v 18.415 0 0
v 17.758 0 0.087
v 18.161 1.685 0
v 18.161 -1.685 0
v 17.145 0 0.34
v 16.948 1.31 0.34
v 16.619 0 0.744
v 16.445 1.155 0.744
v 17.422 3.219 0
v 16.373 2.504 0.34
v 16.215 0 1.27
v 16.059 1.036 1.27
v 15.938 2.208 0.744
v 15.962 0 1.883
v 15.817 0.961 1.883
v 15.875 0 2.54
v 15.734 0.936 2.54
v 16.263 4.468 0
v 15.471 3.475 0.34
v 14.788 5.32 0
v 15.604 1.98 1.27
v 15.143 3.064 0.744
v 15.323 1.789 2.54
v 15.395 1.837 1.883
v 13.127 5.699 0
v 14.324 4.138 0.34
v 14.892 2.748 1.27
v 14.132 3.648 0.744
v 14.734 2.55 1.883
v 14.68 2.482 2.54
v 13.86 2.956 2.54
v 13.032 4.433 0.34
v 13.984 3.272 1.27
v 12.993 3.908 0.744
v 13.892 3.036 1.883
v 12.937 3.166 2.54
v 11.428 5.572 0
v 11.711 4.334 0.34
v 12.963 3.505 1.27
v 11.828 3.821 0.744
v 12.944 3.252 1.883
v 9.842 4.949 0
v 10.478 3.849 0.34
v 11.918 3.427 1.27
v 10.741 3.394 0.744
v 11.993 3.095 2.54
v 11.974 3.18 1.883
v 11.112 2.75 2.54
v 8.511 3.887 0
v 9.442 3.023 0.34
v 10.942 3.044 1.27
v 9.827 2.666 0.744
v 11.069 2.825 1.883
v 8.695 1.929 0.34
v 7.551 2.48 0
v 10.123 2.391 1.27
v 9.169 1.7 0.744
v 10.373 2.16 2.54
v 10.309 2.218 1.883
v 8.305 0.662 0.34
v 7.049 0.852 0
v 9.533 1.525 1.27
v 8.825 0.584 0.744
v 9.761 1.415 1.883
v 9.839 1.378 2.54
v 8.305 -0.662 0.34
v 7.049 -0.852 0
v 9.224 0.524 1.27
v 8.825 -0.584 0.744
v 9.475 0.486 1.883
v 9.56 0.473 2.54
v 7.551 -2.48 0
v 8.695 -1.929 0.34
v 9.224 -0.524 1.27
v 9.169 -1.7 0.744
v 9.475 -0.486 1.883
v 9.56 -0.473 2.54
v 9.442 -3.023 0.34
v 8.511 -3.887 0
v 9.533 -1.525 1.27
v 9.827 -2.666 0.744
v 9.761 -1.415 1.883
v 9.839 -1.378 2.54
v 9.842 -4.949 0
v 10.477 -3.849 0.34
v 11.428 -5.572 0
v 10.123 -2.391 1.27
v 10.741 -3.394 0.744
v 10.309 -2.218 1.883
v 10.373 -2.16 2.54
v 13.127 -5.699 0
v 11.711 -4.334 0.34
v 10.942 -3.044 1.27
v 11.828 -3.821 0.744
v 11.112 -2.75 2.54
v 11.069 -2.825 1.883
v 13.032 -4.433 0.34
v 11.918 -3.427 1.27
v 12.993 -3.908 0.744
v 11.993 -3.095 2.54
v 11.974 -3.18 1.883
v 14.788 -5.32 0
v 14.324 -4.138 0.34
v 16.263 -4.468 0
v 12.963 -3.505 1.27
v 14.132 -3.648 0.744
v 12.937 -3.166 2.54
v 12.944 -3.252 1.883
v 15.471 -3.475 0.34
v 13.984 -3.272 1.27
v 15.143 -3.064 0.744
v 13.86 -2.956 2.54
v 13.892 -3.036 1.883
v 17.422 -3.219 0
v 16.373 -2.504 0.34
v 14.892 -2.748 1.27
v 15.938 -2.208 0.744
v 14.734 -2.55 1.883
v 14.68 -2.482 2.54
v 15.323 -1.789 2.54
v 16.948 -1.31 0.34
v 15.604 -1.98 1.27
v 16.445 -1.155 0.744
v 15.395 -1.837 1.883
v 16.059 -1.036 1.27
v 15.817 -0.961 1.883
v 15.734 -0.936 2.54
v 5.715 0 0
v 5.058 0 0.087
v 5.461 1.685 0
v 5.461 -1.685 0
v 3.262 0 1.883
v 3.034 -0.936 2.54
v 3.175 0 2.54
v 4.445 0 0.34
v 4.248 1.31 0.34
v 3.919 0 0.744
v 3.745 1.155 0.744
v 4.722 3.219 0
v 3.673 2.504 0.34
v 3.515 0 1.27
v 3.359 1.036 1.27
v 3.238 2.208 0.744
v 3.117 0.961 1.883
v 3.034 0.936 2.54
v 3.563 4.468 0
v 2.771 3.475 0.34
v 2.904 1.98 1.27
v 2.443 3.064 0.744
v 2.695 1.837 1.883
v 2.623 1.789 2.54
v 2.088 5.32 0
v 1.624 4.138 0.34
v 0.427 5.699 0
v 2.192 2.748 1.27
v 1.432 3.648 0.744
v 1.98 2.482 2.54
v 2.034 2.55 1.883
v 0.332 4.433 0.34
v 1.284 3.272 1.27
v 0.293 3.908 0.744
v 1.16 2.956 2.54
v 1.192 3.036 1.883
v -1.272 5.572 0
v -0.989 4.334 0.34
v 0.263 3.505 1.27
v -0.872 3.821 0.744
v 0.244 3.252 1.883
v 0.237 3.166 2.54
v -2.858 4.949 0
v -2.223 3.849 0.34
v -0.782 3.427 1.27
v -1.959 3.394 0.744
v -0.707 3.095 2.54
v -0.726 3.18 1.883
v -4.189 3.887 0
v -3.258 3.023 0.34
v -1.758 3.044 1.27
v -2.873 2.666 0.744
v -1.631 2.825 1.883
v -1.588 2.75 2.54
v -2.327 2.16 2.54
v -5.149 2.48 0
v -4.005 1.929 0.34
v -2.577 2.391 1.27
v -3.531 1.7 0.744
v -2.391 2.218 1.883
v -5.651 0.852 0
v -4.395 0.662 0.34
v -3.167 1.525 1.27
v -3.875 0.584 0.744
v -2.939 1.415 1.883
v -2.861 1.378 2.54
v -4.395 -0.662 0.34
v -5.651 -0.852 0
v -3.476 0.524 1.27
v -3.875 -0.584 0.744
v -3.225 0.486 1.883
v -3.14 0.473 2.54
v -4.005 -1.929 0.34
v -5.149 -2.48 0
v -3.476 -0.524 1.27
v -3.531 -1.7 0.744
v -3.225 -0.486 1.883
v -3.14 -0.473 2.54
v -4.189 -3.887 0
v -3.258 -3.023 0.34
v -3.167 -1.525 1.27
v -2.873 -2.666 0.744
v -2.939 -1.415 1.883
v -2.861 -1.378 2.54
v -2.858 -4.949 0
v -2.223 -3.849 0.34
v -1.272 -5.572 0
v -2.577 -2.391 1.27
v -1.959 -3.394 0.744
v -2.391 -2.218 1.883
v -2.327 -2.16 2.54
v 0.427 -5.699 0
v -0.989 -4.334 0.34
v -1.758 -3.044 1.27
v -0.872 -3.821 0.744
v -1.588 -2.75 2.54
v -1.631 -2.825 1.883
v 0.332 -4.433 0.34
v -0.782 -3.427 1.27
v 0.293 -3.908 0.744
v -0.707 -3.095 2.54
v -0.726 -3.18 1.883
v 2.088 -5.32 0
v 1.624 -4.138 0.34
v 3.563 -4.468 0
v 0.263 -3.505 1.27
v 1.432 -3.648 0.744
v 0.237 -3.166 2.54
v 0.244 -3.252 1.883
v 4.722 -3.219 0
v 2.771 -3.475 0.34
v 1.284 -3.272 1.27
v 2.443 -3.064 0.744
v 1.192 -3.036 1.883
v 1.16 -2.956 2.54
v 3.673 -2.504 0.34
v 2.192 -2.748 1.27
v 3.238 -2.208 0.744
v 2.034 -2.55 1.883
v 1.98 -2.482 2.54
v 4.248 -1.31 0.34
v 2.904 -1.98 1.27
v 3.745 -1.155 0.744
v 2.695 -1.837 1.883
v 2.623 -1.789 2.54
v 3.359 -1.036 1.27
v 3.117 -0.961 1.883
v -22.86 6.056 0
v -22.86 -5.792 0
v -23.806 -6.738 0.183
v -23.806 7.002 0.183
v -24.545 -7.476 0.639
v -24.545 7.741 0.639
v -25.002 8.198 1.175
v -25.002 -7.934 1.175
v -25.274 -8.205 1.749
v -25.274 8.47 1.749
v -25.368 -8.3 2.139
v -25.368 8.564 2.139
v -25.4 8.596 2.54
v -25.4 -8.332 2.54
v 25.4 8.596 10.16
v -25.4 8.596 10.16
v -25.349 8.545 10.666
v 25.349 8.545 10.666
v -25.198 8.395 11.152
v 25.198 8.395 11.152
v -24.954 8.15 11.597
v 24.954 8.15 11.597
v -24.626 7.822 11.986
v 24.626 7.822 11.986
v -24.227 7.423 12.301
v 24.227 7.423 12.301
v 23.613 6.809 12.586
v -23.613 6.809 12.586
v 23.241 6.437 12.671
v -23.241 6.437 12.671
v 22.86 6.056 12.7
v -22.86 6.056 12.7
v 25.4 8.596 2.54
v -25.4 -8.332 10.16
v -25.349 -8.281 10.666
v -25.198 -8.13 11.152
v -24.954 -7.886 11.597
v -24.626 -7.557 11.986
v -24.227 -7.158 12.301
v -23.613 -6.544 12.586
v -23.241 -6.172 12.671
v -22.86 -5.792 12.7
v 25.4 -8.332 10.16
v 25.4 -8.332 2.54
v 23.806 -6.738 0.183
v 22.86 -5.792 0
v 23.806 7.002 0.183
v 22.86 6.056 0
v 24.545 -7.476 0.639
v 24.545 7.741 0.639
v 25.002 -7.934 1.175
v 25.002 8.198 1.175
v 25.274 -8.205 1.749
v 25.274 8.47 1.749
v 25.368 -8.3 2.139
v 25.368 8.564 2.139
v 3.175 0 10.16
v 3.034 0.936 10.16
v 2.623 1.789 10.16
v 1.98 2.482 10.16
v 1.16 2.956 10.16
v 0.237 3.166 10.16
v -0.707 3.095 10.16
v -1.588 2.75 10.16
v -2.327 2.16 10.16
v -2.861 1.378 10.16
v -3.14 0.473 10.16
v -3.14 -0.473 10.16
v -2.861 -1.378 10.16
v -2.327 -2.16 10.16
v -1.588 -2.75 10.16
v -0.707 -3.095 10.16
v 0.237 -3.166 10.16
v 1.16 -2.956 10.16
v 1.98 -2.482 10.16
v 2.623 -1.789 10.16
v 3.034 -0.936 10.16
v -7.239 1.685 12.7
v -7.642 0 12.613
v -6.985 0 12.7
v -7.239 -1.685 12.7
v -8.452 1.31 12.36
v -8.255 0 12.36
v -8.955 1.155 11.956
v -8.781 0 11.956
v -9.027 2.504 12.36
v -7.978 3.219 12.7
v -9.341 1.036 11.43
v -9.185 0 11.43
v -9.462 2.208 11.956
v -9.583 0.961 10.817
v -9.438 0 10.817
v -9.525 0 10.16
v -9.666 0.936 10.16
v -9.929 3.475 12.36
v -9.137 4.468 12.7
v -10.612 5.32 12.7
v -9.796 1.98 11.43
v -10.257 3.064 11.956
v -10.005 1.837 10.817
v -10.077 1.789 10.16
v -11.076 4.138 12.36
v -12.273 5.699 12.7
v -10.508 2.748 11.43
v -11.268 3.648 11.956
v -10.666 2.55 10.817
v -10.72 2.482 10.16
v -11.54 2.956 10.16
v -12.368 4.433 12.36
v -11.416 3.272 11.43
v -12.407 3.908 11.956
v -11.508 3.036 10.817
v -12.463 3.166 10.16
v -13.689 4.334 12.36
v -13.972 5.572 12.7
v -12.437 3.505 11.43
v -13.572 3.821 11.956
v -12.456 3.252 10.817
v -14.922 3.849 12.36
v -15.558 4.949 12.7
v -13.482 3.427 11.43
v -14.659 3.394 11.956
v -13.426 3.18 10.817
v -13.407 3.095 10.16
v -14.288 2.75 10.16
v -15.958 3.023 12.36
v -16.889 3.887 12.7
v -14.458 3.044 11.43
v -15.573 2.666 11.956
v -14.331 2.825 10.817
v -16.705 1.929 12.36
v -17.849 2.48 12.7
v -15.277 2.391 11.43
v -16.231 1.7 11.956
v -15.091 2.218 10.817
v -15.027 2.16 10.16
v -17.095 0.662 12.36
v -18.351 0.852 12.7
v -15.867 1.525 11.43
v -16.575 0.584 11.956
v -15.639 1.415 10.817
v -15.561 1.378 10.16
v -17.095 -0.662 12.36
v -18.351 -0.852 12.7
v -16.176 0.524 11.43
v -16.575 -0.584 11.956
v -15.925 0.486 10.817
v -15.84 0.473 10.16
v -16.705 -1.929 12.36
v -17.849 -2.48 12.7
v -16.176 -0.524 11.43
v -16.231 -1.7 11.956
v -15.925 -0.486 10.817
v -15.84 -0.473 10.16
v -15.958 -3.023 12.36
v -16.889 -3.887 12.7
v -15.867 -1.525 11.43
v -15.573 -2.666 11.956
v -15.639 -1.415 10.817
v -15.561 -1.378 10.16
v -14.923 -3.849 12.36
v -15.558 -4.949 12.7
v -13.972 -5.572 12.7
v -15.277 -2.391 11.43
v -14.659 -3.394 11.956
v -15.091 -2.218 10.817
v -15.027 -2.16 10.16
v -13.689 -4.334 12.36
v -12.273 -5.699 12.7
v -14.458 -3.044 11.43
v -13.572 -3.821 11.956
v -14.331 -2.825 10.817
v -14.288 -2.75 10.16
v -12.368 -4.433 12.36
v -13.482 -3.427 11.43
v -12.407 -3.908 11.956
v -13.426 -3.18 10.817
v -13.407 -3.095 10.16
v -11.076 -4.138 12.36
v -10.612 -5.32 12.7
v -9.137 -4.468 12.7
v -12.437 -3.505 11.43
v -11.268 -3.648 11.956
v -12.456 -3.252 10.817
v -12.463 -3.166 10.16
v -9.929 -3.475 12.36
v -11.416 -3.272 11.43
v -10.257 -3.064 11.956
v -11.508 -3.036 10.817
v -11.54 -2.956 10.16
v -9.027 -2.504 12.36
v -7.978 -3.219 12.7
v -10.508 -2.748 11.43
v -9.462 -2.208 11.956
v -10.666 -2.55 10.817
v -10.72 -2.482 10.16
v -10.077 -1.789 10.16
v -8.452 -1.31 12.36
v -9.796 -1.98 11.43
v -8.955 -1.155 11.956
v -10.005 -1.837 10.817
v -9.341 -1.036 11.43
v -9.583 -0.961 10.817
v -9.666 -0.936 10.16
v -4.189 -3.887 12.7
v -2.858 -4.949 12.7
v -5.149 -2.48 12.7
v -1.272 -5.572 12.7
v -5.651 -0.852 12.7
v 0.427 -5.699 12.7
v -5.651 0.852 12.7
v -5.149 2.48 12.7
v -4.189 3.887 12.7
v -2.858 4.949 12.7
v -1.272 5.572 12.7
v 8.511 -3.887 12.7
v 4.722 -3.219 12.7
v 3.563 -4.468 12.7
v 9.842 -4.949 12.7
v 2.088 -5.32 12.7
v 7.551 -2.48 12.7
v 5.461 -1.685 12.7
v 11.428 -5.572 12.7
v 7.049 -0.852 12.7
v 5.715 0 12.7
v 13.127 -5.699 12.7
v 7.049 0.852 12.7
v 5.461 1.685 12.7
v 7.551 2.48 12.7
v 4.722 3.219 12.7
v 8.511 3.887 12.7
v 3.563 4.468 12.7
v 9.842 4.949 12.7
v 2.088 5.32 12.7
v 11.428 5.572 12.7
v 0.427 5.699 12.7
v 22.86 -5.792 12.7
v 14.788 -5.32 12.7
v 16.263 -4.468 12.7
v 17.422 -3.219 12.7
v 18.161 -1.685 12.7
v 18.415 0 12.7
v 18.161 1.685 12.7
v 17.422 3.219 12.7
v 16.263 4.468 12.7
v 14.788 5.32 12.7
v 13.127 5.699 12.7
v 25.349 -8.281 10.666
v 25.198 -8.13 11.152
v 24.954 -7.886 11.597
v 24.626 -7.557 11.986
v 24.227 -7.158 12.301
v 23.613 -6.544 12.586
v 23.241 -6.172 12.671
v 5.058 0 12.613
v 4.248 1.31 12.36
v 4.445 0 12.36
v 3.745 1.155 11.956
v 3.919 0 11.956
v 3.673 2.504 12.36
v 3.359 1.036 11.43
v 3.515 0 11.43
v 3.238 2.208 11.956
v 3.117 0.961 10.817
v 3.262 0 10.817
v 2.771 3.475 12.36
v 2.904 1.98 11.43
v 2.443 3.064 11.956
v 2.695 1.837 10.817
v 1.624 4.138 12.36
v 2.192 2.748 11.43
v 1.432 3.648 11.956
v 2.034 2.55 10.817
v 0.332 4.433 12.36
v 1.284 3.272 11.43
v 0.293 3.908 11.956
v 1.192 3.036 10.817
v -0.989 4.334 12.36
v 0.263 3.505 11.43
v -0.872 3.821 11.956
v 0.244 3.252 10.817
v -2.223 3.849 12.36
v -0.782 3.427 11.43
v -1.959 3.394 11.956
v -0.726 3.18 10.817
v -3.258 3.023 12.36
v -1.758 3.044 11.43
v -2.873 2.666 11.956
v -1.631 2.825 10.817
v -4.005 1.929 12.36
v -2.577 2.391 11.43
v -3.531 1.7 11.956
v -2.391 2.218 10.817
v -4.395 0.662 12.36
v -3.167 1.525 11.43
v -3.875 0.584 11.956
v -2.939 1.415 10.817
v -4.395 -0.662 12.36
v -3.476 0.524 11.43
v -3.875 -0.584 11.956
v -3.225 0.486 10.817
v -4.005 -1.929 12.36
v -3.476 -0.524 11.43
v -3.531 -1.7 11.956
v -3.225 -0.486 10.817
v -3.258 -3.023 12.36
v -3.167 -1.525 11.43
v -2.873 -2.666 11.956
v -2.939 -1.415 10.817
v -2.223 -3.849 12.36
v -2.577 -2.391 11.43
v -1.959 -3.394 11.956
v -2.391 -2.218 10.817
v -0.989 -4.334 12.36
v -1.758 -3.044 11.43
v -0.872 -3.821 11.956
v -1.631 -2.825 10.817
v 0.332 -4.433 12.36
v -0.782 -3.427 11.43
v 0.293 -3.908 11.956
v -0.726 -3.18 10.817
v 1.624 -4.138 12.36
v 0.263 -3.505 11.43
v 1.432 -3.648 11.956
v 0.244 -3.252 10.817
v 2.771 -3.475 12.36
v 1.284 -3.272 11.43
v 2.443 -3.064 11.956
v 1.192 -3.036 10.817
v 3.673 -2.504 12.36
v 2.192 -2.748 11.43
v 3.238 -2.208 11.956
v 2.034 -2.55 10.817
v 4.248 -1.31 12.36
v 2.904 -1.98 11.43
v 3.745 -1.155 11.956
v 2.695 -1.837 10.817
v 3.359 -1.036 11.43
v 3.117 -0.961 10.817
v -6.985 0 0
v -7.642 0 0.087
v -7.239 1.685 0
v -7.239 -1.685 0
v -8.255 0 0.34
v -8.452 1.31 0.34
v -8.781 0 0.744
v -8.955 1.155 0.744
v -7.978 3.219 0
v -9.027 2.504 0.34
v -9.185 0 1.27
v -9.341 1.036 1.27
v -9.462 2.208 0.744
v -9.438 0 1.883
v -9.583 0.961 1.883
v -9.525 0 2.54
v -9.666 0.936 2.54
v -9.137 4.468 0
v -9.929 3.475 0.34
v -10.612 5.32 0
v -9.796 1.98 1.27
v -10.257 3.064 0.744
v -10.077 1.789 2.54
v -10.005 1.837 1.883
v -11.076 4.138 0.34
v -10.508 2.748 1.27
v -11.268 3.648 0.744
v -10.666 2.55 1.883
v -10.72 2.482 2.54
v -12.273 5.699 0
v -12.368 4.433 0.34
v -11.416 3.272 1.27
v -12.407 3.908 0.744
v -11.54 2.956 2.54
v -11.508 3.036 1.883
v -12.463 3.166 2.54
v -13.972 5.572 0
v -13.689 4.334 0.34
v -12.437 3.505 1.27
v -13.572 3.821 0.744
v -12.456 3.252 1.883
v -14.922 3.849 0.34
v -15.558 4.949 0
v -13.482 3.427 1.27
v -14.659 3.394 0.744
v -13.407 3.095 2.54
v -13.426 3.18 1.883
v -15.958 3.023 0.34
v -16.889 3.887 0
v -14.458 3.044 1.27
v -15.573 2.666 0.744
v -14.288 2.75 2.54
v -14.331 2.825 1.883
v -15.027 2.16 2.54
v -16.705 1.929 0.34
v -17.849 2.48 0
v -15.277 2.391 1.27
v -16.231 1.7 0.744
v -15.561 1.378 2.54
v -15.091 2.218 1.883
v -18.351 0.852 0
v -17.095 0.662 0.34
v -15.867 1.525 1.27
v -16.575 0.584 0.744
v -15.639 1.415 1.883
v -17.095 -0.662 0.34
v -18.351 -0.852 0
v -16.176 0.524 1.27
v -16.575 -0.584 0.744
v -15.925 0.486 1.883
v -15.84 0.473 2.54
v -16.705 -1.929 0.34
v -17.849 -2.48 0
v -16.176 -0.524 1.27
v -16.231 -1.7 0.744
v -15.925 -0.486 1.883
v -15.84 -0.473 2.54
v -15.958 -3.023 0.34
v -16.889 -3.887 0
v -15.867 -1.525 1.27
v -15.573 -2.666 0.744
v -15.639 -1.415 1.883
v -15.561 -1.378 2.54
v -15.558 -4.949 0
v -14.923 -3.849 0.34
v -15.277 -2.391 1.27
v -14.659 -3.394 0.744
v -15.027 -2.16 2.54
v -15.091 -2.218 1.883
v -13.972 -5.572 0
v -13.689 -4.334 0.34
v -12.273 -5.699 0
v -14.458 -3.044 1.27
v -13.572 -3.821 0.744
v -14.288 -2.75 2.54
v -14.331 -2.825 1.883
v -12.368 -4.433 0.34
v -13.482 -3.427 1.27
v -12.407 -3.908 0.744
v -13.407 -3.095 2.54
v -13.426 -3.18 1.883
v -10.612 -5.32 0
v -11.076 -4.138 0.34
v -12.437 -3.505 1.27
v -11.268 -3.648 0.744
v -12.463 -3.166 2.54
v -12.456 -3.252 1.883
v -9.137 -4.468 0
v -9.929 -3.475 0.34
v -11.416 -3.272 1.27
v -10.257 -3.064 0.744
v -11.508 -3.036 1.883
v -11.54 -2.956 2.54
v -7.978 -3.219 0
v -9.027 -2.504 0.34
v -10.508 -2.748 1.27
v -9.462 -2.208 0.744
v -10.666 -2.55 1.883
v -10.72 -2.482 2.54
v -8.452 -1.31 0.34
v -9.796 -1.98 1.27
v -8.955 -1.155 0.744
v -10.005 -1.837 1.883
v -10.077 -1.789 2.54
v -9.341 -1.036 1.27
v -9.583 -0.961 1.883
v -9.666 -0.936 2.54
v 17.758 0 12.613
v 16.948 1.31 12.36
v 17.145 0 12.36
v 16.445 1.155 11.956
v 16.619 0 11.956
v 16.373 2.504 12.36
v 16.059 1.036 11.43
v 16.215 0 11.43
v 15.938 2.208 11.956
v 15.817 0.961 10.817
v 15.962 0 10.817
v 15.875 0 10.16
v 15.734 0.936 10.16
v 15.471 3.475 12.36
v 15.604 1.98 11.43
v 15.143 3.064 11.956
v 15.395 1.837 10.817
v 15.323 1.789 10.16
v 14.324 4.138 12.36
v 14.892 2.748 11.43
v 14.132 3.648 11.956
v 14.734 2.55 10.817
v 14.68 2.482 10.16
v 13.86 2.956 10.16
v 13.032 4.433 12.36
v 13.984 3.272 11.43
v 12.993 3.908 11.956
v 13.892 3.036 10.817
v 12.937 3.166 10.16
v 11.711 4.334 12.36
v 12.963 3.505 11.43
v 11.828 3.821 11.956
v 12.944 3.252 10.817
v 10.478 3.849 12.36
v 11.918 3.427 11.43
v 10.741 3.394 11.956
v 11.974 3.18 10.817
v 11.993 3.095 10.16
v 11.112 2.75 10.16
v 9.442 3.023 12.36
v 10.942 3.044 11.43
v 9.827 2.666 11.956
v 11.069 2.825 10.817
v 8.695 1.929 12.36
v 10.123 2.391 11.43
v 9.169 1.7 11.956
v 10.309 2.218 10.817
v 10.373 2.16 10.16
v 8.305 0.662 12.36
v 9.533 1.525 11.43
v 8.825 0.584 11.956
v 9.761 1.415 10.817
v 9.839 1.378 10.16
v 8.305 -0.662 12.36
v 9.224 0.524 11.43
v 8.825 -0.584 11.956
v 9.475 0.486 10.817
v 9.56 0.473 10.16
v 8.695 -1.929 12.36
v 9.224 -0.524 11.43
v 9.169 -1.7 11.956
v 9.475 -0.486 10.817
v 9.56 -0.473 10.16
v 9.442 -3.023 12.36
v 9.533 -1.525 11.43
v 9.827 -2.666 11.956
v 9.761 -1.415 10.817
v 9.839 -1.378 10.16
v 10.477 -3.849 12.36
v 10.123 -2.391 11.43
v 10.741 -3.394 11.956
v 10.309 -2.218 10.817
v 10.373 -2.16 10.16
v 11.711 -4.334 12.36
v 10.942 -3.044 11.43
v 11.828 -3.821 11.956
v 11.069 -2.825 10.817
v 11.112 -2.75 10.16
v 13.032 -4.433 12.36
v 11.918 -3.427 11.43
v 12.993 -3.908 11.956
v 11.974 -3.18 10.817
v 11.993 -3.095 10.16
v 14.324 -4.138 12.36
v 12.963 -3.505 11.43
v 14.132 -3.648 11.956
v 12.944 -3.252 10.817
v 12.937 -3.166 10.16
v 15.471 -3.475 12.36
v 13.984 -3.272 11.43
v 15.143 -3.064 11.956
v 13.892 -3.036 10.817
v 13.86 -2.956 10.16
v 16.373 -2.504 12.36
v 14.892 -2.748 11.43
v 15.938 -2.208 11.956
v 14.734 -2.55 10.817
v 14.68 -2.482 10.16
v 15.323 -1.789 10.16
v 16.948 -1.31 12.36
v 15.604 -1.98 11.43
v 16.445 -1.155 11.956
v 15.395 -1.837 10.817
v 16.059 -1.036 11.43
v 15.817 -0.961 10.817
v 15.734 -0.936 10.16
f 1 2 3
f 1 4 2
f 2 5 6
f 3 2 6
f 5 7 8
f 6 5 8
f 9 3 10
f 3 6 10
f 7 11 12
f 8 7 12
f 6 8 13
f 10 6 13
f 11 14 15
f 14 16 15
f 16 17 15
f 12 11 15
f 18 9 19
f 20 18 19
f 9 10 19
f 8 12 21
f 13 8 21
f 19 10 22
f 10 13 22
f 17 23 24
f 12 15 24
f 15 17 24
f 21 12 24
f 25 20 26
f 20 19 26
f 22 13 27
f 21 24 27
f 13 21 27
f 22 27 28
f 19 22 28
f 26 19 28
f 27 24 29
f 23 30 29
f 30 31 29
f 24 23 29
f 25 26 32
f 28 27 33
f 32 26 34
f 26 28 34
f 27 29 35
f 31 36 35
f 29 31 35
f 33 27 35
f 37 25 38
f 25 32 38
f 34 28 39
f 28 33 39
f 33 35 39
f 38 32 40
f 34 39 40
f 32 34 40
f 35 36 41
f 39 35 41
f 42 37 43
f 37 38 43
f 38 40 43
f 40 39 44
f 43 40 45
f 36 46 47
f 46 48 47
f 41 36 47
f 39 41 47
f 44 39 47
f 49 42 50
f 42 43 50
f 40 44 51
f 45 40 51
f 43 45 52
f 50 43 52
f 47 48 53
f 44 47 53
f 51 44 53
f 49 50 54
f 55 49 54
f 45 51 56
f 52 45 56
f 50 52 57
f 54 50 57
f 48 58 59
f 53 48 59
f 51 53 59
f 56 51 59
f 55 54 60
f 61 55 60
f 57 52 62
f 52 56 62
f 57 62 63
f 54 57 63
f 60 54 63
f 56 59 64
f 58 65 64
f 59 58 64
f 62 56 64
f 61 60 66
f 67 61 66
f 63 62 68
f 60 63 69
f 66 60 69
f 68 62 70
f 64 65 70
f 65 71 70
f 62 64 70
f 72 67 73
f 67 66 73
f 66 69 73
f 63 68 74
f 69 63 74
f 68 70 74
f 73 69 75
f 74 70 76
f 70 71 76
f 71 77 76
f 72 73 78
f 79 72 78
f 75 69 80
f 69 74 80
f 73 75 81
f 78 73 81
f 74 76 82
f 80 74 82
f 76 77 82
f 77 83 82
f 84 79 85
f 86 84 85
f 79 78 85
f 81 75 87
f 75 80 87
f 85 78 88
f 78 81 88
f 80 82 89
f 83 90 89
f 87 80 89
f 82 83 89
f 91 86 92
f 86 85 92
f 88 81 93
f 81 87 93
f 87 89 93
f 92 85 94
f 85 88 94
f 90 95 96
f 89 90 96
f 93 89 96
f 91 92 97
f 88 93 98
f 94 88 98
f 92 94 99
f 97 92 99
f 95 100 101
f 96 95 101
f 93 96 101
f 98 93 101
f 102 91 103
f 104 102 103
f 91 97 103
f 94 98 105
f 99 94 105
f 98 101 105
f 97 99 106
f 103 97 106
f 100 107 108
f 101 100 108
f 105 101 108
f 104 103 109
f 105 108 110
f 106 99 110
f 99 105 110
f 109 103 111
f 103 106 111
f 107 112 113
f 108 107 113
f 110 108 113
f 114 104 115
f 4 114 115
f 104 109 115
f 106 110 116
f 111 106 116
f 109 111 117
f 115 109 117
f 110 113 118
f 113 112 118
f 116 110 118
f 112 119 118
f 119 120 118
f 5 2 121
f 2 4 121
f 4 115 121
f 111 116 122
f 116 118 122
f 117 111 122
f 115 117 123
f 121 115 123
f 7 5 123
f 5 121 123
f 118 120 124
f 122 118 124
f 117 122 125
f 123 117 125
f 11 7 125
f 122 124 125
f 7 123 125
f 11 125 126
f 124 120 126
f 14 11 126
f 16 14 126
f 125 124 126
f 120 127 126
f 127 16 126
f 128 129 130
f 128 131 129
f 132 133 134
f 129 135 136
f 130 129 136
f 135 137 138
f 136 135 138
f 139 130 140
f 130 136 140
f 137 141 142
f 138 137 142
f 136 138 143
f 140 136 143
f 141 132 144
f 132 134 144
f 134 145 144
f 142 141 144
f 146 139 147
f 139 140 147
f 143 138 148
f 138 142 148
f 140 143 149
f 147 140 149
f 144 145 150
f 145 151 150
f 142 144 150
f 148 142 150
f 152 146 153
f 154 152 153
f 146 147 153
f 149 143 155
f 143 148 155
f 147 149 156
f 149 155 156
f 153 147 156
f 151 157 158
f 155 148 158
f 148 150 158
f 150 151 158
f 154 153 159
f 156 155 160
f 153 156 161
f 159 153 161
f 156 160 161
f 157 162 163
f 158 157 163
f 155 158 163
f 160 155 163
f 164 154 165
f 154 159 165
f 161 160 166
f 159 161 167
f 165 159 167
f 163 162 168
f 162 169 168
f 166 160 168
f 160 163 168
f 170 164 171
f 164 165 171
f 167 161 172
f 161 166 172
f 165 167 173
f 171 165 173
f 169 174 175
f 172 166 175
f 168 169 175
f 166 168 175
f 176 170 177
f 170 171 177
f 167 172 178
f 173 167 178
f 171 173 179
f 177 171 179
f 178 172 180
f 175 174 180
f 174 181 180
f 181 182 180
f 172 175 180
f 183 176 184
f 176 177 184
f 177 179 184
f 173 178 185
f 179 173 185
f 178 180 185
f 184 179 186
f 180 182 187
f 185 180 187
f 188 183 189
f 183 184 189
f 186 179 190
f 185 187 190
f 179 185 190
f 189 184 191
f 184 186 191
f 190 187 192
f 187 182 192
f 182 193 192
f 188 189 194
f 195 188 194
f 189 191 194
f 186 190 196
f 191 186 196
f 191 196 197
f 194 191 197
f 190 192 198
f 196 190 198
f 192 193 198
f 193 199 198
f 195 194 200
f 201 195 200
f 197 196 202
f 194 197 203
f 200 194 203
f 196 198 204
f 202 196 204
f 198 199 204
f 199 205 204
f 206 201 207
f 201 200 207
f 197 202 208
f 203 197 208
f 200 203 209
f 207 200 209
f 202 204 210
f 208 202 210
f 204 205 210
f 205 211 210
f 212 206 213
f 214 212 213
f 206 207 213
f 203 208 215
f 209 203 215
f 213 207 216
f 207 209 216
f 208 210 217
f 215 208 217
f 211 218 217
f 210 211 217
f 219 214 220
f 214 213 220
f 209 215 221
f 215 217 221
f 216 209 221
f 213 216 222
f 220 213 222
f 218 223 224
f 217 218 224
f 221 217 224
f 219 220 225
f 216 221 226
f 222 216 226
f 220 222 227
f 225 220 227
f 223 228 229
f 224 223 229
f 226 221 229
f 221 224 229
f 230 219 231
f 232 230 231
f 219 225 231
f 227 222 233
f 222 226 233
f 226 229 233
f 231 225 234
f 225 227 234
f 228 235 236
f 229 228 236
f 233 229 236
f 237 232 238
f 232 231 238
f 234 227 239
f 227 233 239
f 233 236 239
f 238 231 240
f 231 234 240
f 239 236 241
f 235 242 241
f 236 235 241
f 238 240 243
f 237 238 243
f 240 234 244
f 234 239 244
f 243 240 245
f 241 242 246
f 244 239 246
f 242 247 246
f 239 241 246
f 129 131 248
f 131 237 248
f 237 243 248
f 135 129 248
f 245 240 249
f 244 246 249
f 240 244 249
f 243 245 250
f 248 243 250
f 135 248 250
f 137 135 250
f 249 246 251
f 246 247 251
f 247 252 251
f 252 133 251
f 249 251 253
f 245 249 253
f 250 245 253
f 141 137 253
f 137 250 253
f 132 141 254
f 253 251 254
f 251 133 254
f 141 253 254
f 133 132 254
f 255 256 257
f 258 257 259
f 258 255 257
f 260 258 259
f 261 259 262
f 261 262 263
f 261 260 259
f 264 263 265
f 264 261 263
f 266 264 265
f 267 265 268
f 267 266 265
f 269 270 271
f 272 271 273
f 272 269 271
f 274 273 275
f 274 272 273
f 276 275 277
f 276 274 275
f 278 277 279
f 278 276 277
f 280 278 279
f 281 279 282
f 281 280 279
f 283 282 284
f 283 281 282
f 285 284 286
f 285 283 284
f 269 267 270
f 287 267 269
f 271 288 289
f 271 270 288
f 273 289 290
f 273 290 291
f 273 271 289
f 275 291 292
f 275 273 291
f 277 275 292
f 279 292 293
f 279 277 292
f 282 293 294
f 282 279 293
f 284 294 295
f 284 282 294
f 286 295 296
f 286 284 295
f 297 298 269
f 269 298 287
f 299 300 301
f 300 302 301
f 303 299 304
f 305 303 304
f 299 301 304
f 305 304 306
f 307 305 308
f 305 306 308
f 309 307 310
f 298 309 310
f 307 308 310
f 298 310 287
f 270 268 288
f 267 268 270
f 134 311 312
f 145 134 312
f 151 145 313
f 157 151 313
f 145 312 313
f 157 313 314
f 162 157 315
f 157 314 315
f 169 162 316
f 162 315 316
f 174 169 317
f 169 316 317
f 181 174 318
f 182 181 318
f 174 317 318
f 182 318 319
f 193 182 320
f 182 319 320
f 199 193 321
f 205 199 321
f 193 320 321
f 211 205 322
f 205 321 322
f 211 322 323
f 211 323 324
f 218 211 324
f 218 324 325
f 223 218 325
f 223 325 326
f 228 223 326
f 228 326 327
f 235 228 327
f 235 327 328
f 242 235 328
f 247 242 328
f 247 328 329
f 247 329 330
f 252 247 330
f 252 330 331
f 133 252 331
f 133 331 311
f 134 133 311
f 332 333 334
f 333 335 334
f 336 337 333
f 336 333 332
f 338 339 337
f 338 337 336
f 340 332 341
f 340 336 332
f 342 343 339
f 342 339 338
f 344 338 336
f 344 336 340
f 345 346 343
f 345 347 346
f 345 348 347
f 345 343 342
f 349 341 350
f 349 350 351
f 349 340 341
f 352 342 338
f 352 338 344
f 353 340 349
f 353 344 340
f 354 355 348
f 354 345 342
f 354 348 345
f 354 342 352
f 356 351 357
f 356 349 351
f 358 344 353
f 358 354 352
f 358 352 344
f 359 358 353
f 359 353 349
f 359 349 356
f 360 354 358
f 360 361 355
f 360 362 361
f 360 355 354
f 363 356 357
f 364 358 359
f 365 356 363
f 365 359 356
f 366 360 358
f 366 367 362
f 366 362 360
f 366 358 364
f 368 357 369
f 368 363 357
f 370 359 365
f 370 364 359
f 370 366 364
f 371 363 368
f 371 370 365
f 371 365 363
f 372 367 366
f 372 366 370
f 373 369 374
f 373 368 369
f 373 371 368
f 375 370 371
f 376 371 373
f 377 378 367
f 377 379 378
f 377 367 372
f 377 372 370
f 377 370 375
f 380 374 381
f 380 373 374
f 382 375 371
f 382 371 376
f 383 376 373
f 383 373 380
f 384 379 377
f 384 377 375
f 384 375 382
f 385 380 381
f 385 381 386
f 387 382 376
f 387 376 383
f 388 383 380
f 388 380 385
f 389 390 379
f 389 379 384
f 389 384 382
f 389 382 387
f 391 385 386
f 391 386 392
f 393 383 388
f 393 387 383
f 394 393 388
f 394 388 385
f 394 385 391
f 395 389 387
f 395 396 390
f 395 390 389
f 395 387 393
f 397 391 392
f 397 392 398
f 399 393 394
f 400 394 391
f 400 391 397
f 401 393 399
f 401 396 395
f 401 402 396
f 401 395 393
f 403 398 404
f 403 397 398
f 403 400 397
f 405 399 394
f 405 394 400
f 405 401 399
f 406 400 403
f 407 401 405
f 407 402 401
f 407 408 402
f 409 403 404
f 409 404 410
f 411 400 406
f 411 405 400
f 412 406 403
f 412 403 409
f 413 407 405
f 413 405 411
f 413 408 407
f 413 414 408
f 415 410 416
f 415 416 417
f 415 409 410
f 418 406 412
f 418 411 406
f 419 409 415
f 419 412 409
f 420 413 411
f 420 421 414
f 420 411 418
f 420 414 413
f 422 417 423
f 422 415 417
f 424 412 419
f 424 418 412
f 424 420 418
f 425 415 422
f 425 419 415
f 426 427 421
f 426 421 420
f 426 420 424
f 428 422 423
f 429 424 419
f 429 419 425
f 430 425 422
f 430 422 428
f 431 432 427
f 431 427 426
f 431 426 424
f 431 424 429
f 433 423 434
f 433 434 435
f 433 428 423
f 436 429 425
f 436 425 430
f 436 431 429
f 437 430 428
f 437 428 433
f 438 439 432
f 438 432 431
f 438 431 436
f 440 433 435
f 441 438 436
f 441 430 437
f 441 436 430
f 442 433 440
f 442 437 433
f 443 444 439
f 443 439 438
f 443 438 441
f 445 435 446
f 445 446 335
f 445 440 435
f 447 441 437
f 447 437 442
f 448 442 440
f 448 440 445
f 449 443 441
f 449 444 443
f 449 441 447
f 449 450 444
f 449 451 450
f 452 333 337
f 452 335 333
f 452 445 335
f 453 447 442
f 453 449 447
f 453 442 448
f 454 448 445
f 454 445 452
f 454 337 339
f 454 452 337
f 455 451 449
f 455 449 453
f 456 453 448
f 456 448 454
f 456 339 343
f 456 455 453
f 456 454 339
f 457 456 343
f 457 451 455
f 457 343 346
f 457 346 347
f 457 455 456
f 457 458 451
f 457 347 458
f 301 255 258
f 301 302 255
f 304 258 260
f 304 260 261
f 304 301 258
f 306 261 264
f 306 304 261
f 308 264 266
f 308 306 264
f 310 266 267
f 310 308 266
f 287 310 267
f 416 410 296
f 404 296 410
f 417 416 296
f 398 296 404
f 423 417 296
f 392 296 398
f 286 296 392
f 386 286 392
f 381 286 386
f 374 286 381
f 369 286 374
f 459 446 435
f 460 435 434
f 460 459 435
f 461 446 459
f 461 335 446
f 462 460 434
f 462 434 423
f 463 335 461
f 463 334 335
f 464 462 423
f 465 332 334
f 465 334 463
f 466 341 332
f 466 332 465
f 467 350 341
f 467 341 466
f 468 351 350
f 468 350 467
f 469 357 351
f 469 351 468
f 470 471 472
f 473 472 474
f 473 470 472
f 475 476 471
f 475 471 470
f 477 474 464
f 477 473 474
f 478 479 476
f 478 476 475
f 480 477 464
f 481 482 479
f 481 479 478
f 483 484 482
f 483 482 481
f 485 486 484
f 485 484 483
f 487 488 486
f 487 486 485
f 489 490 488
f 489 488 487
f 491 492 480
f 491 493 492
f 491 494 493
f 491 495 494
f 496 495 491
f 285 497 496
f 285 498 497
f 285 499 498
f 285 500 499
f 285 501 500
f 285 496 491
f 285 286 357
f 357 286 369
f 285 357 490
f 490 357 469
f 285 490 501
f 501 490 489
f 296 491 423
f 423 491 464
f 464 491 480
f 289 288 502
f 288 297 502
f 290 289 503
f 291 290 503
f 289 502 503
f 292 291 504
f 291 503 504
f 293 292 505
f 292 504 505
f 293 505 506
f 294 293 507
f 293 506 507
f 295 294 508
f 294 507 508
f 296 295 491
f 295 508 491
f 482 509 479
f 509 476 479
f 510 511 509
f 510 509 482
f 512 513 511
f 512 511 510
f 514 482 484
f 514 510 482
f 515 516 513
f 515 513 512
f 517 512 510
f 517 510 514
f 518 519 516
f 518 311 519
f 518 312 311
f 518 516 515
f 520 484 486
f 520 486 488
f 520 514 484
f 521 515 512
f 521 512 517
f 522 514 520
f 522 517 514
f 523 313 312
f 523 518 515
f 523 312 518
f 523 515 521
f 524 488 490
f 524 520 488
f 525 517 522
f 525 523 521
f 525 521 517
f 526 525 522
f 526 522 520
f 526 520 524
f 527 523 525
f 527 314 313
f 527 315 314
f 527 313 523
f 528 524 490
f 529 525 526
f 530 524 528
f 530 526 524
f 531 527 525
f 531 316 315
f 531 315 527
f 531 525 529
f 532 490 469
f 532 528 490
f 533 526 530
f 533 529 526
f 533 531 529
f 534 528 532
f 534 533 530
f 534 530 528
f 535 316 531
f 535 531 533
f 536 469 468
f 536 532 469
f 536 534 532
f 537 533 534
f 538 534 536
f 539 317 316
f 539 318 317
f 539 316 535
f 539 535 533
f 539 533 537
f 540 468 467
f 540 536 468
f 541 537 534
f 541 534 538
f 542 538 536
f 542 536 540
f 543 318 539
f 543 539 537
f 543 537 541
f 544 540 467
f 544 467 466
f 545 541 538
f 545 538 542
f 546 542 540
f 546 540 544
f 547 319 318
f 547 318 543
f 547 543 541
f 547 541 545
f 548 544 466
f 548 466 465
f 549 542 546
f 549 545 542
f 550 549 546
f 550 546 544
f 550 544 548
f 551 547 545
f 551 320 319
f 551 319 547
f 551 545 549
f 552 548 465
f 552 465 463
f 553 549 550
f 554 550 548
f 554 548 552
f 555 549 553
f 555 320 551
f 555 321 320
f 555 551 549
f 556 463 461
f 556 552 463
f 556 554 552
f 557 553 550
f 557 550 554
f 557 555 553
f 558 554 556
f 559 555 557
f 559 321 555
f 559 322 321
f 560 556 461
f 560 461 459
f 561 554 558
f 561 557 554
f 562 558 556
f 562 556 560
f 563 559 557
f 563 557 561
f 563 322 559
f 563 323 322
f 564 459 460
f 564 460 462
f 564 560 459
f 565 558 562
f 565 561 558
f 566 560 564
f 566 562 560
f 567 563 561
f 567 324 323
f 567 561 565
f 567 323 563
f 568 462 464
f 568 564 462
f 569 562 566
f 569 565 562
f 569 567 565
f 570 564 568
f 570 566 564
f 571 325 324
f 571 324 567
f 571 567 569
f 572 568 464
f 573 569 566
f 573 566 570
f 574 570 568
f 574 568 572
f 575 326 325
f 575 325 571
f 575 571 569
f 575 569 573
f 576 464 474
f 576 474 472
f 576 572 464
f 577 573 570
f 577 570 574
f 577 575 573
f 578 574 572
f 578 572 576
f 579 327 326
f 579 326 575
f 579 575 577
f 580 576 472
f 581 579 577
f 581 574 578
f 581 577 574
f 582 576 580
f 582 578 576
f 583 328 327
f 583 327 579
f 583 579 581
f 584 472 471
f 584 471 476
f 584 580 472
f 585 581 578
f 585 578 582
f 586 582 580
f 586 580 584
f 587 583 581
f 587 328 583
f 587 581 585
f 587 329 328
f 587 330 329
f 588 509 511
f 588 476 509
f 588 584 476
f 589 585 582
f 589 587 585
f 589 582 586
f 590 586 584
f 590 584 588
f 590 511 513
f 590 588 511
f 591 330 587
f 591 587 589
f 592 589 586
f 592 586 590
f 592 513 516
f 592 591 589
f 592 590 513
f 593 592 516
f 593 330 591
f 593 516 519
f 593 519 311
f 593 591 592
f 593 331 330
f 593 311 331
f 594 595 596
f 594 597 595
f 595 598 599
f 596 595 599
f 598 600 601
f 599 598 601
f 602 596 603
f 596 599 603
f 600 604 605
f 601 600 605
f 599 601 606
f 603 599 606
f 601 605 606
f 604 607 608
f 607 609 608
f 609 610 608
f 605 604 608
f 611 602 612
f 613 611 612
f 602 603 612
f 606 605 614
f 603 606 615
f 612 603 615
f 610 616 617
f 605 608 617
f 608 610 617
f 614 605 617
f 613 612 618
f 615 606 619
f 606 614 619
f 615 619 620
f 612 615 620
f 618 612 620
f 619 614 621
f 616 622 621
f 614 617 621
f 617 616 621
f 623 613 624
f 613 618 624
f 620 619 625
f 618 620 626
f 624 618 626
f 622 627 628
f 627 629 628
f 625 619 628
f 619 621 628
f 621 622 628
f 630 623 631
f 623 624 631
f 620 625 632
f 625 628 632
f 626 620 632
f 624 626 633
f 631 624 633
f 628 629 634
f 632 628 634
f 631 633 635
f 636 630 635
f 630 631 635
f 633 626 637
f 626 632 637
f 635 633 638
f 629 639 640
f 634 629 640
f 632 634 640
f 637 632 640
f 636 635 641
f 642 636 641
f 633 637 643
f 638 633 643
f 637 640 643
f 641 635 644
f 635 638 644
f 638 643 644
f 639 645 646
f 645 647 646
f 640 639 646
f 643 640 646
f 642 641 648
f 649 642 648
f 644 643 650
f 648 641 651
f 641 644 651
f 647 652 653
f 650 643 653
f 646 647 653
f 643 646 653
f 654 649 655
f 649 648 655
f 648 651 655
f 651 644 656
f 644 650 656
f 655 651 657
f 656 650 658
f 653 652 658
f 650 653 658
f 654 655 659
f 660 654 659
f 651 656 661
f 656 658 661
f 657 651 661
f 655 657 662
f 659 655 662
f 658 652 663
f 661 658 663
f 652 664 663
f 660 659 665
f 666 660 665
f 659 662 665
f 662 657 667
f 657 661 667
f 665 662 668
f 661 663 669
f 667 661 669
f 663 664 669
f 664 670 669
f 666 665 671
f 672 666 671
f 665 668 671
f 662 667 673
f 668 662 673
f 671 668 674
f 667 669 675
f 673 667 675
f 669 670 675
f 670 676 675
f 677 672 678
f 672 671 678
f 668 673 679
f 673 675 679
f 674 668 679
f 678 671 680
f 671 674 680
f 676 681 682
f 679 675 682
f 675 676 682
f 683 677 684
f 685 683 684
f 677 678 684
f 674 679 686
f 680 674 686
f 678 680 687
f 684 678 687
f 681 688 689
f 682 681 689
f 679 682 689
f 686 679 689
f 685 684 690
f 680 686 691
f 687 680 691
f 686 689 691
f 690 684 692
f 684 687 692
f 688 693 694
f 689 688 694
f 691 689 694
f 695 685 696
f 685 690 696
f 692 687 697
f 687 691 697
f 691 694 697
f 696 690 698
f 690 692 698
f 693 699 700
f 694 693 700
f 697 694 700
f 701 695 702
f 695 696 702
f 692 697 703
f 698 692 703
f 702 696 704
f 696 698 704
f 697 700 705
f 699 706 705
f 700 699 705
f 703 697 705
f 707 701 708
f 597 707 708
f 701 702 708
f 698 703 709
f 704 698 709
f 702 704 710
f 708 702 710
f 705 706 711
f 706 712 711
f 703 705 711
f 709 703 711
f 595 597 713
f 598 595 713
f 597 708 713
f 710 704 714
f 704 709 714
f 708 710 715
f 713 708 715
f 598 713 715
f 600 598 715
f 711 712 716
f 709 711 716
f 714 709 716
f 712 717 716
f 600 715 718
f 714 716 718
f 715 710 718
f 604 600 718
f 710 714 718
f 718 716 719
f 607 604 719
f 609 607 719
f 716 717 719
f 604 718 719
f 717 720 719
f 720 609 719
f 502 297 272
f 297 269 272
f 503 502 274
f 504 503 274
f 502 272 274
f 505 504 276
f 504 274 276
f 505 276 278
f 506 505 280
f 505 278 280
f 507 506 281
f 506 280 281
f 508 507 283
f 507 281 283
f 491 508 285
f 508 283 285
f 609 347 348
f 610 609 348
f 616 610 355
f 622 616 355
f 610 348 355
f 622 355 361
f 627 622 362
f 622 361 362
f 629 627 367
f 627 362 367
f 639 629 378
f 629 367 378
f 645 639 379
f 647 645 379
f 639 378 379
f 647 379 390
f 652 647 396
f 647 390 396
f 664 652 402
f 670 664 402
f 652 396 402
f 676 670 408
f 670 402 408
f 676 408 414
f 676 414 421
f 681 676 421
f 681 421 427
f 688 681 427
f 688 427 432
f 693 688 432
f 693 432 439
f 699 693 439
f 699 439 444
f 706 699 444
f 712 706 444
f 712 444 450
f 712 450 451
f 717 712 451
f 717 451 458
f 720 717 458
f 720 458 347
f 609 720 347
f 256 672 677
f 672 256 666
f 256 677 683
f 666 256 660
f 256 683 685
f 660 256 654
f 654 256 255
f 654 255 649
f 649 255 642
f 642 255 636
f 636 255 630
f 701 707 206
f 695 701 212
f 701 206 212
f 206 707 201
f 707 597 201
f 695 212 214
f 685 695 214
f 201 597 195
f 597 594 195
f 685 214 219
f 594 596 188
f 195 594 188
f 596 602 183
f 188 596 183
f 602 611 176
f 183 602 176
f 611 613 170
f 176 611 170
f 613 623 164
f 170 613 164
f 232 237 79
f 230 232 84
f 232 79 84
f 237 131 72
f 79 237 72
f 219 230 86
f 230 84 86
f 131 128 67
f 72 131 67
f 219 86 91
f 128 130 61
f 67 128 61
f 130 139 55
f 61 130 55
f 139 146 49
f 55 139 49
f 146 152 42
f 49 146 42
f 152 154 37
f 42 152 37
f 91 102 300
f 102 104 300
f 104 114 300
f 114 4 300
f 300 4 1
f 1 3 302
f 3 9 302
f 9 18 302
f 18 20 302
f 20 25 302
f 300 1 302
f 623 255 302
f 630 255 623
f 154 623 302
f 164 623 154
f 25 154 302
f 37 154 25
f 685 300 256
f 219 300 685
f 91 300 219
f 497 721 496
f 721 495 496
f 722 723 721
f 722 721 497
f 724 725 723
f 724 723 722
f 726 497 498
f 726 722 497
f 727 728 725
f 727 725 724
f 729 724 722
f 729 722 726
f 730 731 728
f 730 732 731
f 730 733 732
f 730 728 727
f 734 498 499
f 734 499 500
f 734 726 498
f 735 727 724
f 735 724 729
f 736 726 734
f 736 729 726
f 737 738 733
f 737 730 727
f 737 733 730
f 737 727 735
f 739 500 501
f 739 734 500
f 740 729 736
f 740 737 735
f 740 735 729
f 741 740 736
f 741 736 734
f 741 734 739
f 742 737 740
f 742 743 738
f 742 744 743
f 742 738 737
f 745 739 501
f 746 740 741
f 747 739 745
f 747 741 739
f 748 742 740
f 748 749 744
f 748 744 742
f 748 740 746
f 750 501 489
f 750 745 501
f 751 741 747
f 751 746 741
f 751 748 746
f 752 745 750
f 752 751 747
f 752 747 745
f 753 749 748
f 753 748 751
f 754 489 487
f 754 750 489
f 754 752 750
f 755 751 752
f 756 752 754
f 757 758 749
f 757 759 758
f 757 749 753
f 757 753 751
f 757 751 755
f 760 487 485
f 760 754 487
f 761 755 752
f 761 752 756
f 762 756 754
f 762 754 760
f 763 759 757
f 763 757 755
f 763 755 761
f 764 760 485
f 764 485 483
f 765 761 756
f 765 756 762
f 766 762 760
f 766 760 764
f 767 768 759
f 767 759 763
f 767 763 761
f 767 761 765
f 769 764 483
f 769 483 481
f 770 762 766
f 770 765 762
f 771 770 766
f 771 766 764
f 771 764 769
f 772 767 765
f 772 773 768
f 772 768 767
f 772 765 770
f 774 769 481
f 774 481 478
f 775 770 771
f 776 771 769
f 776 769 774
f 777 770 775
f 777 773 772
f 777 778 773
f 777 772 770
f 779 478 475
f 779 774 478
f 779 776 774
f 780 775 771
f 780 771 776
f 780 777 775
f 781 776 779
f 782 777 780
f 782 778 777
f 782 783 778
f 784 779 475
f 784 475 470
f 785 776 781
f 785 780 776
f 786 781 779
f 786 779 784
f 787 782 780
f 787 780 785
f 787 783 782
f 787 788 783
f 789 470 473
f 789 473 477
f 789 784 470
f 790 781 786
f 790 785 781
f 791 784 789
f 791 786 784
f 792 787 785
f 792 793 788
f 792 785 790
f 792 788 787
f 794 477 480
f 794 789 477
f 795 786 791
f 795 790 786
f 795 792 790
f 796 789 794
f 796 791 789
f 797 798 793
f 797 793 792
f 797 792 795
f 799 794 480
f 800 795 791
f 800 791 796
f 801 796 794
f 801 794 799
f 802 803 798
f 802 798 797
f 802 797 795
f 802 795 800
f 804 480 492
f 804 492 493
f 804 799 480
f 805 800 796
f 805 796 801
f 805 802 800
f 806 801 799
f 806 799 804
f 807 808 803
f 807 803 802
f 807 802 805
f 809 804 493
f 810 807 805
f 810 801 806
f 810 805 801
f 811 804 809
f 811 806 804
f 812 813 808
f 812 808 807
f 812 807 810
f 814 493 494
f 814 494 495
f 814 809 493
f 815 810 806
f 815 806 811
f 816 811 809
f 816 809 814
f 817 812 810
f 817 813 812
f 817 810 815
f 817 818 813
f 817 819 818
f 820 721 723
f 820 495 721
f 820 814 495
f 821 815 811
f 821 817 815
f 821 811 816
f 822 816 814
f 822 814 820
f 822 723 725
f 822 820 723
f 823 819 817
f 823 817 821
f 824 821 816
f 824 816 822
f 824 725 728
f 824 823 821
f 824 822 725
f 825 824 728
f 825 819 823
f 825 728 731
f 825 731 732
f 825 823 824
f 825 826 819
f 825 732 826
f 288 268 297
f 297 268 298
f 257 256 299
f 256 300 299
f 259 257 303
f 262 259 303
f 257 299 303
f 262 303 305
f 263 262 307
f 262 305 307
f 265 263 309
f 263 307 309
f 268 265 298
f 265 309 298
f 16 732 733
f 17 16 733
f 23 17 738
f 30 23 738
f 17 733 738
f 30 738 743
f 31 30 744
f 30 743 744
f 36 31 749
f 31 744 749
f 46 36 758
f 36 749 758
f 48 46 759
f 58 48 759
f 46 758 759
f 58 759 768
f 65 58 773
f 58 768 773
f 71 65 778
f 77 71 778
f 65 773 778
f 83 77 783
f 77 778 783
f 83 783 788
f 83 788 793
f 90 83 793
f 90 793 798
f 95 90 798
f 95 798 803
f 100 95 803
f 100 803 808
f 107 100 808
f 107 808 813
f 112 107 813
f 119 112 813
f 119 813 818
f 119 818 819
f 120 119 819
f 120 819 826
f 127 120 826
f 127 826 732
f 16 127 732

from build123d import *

# Parameters (mm, degrees)
F0_W     = 50.8
F0_H     = 16.92773588
F1_DEPTH = 12.7
F2_R     = 3.175
F3_DEPTH = 25.4
F4_R     = 2.54
F5_R     = 2.54


with BuildPart() as f1:
    # F0 (on Top) → F1 (new body)
    with BuildSketch(Plane.XY):
        with Locations((0, 0.1322478056)):
            Rectangle(F0_W, F0_H)
    extrude(amount=F1_DEPTH)

    # F2 (on face) → F3 (cut)
    with BuildSketch(Plane.XY.offset(12.7)):
        with Locations((-12.7, 0)):
            Circle(F2_R)
        Circle(F2_R)
        with Locations((12.7, 0)):
            Circle(F2_R)
    extrude(amount=-F3_DEPTH, mode=Mode.SUBTRACT)

    # F4
    f4_edges = [f1.edges().sort_by_distance(p)[0] for p in [
        (-15.875, 0, 12.7),
        (-3.175, 0, 12.7),
        (9.525, 0, 12.7),
        (-15.875, 0, 0),
        (-3.175, 0, 0),
        (9.525, 0, 0),
    ]]
    fillet(f4_edges, radius=F4_R)

    # F5
    f5_edges = [f1.edges().sort_by_distance(p)[0] for p in [
        (0, 8.596116, 12.7),
        (25.4, 0.132248, 12.7),
        (0, -8.33162, 12.7),
        (-25.4, 0.132248, 12.7),
        (0, 8.596116, 0),
        (-25.4, 0.132248, 0),
        (0, -8.33162, 0),
        (25.4, 0.132248, 0),
    ]]
    fillet(f5_edges, radius=F5_R)


solid = f1.part
